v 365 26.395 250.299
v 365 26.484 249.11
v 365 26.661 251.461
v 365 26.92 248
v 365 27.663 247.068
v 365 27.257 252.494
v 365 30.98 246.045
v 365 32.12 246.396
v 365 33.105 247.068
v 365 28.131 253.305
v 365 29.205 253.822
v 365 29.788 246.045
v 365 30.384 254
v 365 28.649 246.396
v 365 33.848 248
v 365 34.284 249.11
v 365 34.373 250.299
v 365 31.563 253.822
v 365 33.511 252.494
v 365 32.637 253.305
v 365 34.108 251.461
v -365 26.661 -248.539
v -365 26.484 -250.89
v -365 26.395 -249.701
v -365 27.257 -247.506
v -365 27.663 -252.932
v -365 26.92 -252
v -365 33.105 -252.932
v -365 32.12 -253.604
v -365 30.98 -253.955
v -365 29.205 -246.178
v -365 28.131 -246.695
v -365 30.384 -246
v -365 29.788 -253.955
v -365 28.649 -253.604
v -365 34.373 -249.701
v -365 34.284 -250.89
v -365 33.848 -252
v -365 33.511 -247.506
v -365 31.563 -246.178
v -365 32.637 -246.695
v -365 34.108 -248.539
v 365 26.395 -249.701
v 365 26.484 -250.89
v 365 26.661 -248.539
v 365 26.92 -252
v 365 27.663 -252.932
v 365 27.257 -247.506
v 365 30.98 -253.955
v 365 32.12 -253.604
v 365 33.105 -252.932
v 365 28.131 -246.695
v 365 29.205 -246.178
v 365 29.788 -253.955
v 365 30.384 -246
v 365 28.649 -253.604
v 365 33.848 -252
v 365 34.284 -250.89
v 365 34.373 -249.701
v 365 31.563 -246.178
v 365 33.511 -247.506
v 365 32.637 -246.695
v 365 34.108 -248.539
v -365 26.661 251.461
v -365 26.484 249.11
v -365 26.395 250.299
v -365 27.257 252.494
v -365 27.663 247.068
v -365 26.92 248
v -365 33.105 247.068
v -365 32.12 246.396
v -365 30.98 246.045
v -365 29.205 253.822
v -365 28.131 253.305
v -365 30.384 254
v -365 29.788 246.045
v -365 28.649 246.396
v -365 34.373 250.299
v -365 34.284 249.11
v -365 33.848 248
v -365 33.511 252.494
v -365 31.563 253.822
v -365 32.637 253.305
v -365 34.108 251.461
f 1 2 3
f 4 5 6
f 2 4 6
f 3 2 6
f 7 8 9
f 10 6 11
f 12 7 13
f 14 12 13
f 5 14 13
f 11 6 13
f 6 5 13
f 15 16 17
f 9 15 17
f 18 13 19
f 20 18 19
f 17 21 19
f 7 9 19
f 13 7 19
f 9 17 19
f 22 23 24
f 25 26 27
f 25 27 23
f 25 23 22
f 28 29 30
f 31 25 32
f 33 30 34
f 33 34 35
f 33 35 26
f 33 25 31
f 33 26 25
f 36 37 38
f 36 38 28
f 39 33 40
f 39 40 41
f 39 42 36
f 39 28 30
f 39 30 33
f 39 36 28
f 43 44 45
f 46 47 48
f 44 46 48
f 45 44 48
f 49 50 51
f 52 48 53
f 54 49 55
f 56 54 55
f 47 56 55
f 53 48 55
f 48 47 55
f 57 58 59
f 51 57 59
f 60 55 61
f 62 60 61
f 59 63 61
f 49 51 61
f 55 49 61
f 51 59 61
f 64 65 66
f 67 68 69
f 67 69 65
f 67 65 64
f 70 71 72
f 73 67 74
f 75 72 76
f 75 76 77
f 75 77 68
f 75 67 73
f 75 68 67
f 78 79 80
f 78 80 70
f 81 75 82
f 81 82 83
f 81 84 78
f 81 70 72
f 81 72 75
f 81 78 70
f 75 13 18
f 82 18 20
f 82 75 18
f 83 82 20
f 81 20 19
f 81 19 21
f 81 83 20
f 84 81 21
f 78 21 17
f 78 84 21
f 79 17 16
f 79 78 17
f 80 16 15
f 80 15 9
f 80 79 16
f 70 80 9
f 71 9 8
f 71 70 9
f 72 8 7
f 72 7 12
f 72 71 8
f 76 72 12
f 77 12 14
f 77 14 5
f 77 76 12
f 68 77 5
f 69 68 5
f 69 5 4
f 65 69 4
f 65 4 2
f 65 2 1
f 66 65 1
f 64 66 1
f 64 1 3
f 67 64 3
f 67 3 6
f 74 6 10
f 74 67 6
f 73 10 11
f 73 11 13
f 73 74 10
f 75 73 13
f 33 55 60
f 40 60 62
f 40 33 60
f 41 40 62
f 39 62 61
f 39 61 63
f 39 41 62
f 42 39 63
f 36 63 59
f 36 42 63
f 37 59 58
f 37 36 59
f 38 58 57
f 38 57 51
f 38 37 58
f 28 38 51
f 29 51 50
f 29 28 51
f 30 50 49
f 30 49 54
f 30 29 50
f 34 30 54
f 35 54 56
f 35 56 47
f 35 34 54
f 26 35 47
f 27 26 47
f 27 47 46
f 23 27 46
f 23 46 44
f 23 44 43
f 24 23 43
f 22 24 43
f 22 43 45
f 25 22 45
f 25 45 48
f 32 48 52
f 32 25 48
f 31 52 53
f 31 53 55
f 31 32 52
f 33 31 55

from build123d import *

# Parameters (mm, degrees)
BOSS_EXTRUDE1_DEPTH   = 265
BOSS_EXTRUDE1_2_DEPTH = 265
BOSS_EXTRUDE2_DEPTH   = 335
SKETCH16_R            = 4
BOSS_EXTRUDE3_DEPTH   = 730
BOSS_EXTRUDE3_2_DEPTH = 730


with BuildPart() as part:
    # Sketch13 → Boss-Extrude1 (new, symmetric)
    with BuildSketch(Plane.XY):
        with BuildLine():
            Line((356.00446543, 0.899999619), (355.484852164, 0))
            Line((355.484852164, 0), (356.00446543, -0.899999619))
            Line((356.00446543, -0.899999619), (356.00446543, -4.204465866))
            Line((356.00446543, -4.204465866), (360.049999564, -8.25))
            Line((360.049999564, -8.25), (362.59999928, -8.25))
            ThreePointArc((362.59999928, -8.25), (362.741420837, -8.191421273), (362.799999564, -8.049999716))
            Line((362.799999564, -8.049999716), (362.799999564, -4.649999613))
            ThreePointArc((362.799999564, -4.649999613), (362.975735606, -4.225735278), (363.39999994, -4.049999237))
            Line((363.39999994, -4.049999237), (364.300000043, -4.049999237))
            ThreePointArc((364.300000043, -4.049999237), (364.4414216, -4.108577964), (364.500000327, -4.249999521))
            Line((364.500000327, -4.249999521), (364.500000327, -4.349998953))
            ThreePointArc((364.500000327, -4.349998953), (364.558579054, -4.49142051), (364.700000611, -4.549999237))
            Line((364.700000611, -4.549999237), (364.799999716, -4.549999237))
            ThreePointArc((364.799999716, -4.549999237), (364.941421273, -4.608577964), (365, -4.749999521))
            Line((365, -4.749999521), (365, -13.000000346))
            ThreePointArc((365, -13.000000346), (364.414213664, -14.414213664), (363.000000346, -15))
            Line((363.000000346, -15), (354.749999945, -15))
            ThreePointArc((354.749999945, -15), (354.60857832, -14.941421245), (354.549999564, -14.799999619))
            Line((354.549999564, -14.799999619), (354.549999564, -14.69999942))
            ThreePointArc((354.549999564, -14.69999942), (354.49142109, -14.558578474), (354.350000144, -14.5))
            Line((354.350000144, -14.5), (354.250000374, -14.5))
            ThreePointArc((354.250000374, -14.5), (354.108578753, -14.441421247), (354.05, -14.299999626))
            Line((354.05, -14.299999626), (354.05, -13.399999434))
            ThreePointArc((354.05, -13.399999434), (354.225735989, -12.975735226), (354.650000197, -12.799999237))
            Line((354.650000197, -12.799999237), (358.049999924, -12.799999237))
            ThreePointArc((358.049999924, -12.799999237), (358.191421565, -12.741420475), (358.250000327, -12.599998834))
            Line((358.250000327, -12.599998834), (358.250000327, -10.049999237))
            Line((358.250000327, -10.049999237), (354.204466193, -6))
            Line((354.204466193, -6), (350.899999946, -6))
            Line((350.899999946, -6), (350, -5.484851837))
            Line((350, -5.484851837), (349.100000054, -6))
            Line((349.100000054, -6), (345.795533807, -6))
            Line((345.795533807, -6), (341.749999673, -10.049999237))
            Line((341.749999673, -10.049999237), (341.749999673, -12.599998834))
            ThreePointArc((341.749999673, -12.599998834), (341.808578435, -12.741420475), (341.950000076, -12.799999237))
            Line((341.950000076, -12.799999237), (345.349999803, -12.799999237))
            ThreePointArc((345.349999803, -12.799999237), (345.774264011, -12.975735226), (345.95, -13.399999434))
            Line((345.95, -13.399999434), (345.95, -14.299999626))
            ThreePointArc((345.95, -14.299999626), (345.891421247, -14.441421247), (345.749999626, -14.5))
            Line((345.749999626, -14.5), (345.649999856, -14.5))
            ThreePointArc((345.649999856, -14.5), (345.50857891, -14.558578474), (345.450000436, -14.69999942))
            Line((345.450000436, -14.69999942), (345.450000436, -14.799999619))
            ThreePointArc((345.450000436, -14.799999619), (345.39142168, -14.941421245), (345.250000055, -15))
            Line((345.250000055, -15), (336.999999654, -15))
            ThreePointArc((336.999999654, -15), (335.585786336, -14.414213664), (335, -13.000000346))
            Line((335, -13.000000346), (335, -4.749999521))
            ThreePointArc((335, -4.749999521), (335.058578727, -4.608577964), (335.200000284, -4.549999237))
            Line((335.200000284, -4.549999237), (335.299999389, -4.549999237))
            ThreePointArc((335.299999389, -4.549999237), (335.441420946, -4.49142051), (335.499999673, -4.349998953))
            Line((335.499999673, -4.349998953), (335.499999673, -4.249999521))
            ThreePointArc((335.499999673, -4.249999521), (335.5585784, -4.108577964), (335.699999957, -4.049999237))
            Line((335.699999957, -4.049999237), (336.60000006, -4.049999237))
            ThreePointArc((336.60000006, -4.049999237), (337.024264394, -4.225735278), (337.200000436, -4.649999613))
            Line((337.200000436, -4.649999613), (337.200000436, -8.049999716))
            ThreePointArc((337.200000436, -8.049999716), (337.258579163, -8.191421273), (337.40000072, -8.25))
            Line((337.40000072, -8.25), (339.950000436, -8.25))
            Line((339.950000436, -8.25), (343.99553457, -4.204465866))
            Line((343.99553457, -4.204465866), (343.99553457, -0.899999619))
            Line((343.99553457, -0.899999619), (344.515147836, 0))
            Line((344.515147836, 0), (343.99553457, 0.899999619))
            Line((343.99553457, 0.899999619), (343.99553457, 4.204465866))
            Line((343.99553457, 4.204465866), (339.950000436, 8.25))
            Line((339.950000436, 8.25), (337.40000072, 8.25))
            ThreePointArc((337.40000072, 8.25), (337.258579163, 8.191421273), (337.200000436, 8.049999716))
            Line((337.200000436, 8.049999716), (337.200000436, 4.649999613))
            ThreePointArc((337.200000436, 4.649999613), (337.024264394, 4.225735278), (336.60000006, 4.049999237))
            Line((336.60000006, 4.049999237), (335.699999957, 4.049999237))
            ThreePointArc((335.699999957, 4.049999237), (335.5585784, 4.108577964), (335.499999673, 4.249999521))
            Line((335.499999673, 4.249999521), (335.499999673, 4.349998953))
            ThreePointArc((335.499999673, 4.349998953), (335.441420946, 4.49142051), (335.299999389, 4.549999237))
            Line((335.299999389, 4.549999237), (335.200000284, 4.549999237))
            ThreePointArc((335.200000284, 4.549999237), (335.058578727, 4.608577964), (335, 4.749999521))
            Line((335, 4.749999521), (335, 13.000000346))
            ThreePointArc((335, 13.000000346), (335.585786336, 14.414213664), (336.999999654, 15))
            Line((336.999999654, 15), (345.250000055, 15))
            ThreePointArc((345.250000055, 15), (345.39142168, 14.941421245), (345.450000436, 14.799999619))
            Line((345.450000436, 14.799999619), (345.450000436, 14.69999942))
            ThreePointArc((345.450000436, 14.69999942), (345.50857891, 14.558578474), (345.649999856, 14.5))
            Line((345.649999856, 14.5), (345.749999626, 14.5))
            ThreePointArc((345.749999626, 14.5), (345.891421247, 14.441421247), (345.95, 14.299999626))
            Line((345.95, 14.299999626), (345.95, 13.399999434))
            ThreePointArc((345.95, 13.399999434), (345.774264011, 12.975735226), (345.349999803, 12.799999237))
            Line((345.349999803, 12.799999237), (341.950000076, 12.799999237))
            ThreePointArc((341.950000076, 12.799999237), (341.808578435, 12.741420475), (341.749999673, 12.599998834))
            Line((341.749999673, 12.599998834), (341.749999673, 10.049999237))
            Line((341.749999673, 10.049999237), (345.795533807, 6))
            Line((345.795533807, 6), (349.100000054, 6))
            Line((349.100000054, 6), (350, 5.484851837))
            Line((350, 5.484851837), (350.899999946, 6))
            Line((350.899999946, 6), (354.204466193, 6))
            Line((354.204466193, 6), (358.250000327, 10.049999237))
            Line((358.250000327, 10.049999237), (358.250000327, 12.599998834))
            ThreePointArc((358.250000327, 12.599998834), (358.191421565, 12.741420475), (358.049999924, 12.799999237))
            Line((358.049999924, 12.799999237), (354.650000197, 12.799999237))
            ThreePointArc((354.650000197, 12.799999237), (354.225735989, 12.975735226), (354.05, 13.399999434))
            Line((354.05, 13.399999434), (354.05, 14.299999626))
            ThreePointArc((354.05, 14.299999626), (354.108578753, 14.441421247), (354.250000374, 14.5))
            Line((354.250000374, 14.5), (354.350000144, 14.5))
            ThreePointArc((354.350000144, 14.5), (354.49142109, 14.558578474), (354.549999564, 14.69999942))
            Line((354.549999564, 14.69999942), (354.549999564, 14.799999619))
            ThreePointArc((354.549999564, 14.799999619), (354.60857832, 14.941421245), (354.749999945, 15))
            Line((354.749999945, 15), (363.000000346, 15))
            ThreePointArc((363.000000346, 15), (364.414213664, 14.414213664), (365, 13.000000346))
            Line((365, 13.000000346), (365, 4.749999521))
            ThreePointArc((365, 4.749999521), (364.941421273, 4.608577964), (364.799999716, 4.549999237))
            Line((364.799999716, 4.549999237), (364.700000611, 4.549999237))
            ThreePointArc((364.700000611, 4.549999237), (364.558579054, 4.49142051), (364.500000327, 4.349998953))
            Line((364.500000327, 4.349998953), (364.500000327, 4.249999521))
            ThreePointArc((364.500000327, 4.249999521), (364.4414216, 4.108577964), (364.300000043, 4.049999237))
            Line((364.300000043, 4.049999237), (363.39999994, 4.049999237))
            ThreePointArc((363.39999994, 4.049999237), (362.975735606, 4.225735278), (362.799999564, 4.649999613))
            Line((362.799999564, 4.649999613), (362.799999564, 8.049999716))
            ThreePointArc((362.799999564, 8.049999716), (362.741420837, 8.191421273), (362.59999928, 8.25))
            Line((362.59999928, 8.25), (360.049999564, 8.25))
            Line((360.049999564, 8.25), (356.00446543, 4.204465866))
            Line((356.00446543, 4.204465866), (356.00446543, 0.899999619))
        make_face()
        with BuildLine():
            Line((363.70000109, 12.700000408), (363.70000109, 10.499999626))
            ThreePointArc((363.70000109, 10.499999626), (363.407107874, 9.792892851), (362.7000011, 9.499999635))
            Line((362.7000011, 9.499999635), (360.500000318, 9.499999635))
            ThreePointArc((360.500000318, 9.499999635), (359.792893543, 9.792892851), (359.500000327, 10.499999626))
            Line((359.500000327, 10.499999626), (359.500000327, 12.700000408))
            ThreePointArc((359.500000327, 12.700000408), (359.792893543, 13.407107182), (360.500000318, 13.700000398))
            Line((360.500000318, 13.700000398), (362.7000011, 13.700000398))
            ThreePointArc((362.7000011, 13.700000398), (363.407107874, 13.407107182), (363.70000109, 12.700000408))
        make_face(mode=Mode.SUBTRACT)
        with BuildLine():
            Line((353.135929412, 4.518400903), (351.600129524, 3.280561767))
            ThreePointArc((351.600129524, 3.280561767), (350, 3.65), (348.399870476, 3.280561767))
            Line((348.399870476, 3.280561767), (346.864070588, 4.518400903))
            ThreePointArc((346.864070588, 4.518400903), (346.118997741, 3.897155561), (345.494663108, 3.154669473))
            Line((345.494663108, 3.154669473), (346.719438268, 1.600129597))
            ThreePointArc((346.719438268, 1.600129597), (346.35, 0), (346.719438268, -1.600129597))
            Line((346.719438268, -1.600129597), (345.494663108, -3.154669473))
            ThreePointArc((345.494663108, -3.154669473), (346.118997741, -3.897155561), (346.864070588, -4.518400903))
            Line((346.864070588, -4.518400903), (348.399870476, -3.280561767))
            ThreePointArc((348.399870476, -3.280561767), (350, -3.65), (351.600129524, -3.280561767))
            Line((351.600129524, -3.280561767), (353.135929412, -4.518400903))
            ThreePointArc((353.135929412, -4.518400903), (353.881002259, -3.897155561), (354.505336892, -3.154669473))
            Line((354.505336892, -3.154669473), (353.280561732, -1.600129597))
            ThreePointArc((353.280561732, -1.600129597), (353.65, 0), (353.280561732, 1.600129597))
            Line((353.280561732, 1.600129597), (354.505336892, 3.154669473))
            ThreePointArc((354.505336892, 3.154669473), (353.881002259, 3.897155561), (353.135929412, 4.518400903))
        make_face(mode=Mode.SUBTRACT)
        with BuildLine():
            Line((336.29999891, -12.700000408), (336.29999891, -10.499999626))
            ThreePointArc((336.29999891, -10.499999626), (336.592892126, -9.792892851), (337.2999989, -9.499999635))
            Line((337.2999989, -9.499999635), (339.499999682, -9.499999635))
            ThreePointArc((339.499999682, -9.499999635), (340.207106457, -9.792892851), (340.499999673, -10.499999626))
            Line((340.499999673, -10.499999626), (340.499999673, -12.700000408))
            ThreePointArc((340.499999673, -12.700000408), (340.207106457, -13.407107182), (339.499999682, -13.700000398))
            Line((339.499999682, -13.700000398), (337.2999989, -13.700000398))
            ThreePointArc((337.2999989, -13.700000398), (336.592892126, -13.407107182), (336.29999891, -12.700000408))
        make_face(mode=Mode.SUBTRACT)
        with BuildLine():
            Line((360.500000318, -13.700000398), (362.7000011, -13.700000398))
            ThreePointArc((362.7000011, -13.700000398), (363.407107874, -13.407107182), (363.70000109, -12.700000408))
            Line((363.70000109, -12.700000408), (363.70000109, -10.499999626))
            ThreePointArc((363.70000109, -10.499999626), (363.407107874, -9.792892851), (362.7000011, -9.499999635))
            Line((362.7000011, -9.499999635), (360.500000318, -9.499999635))
            ThreePointArc((360.500000318, -9.499999635), (359.792893543, -9.792892851), (359.500000327, -10.499999626))
            Line((359.500000327, -10.499999626), (359.500000327, -12.700000408))
            ThreePointArc((359.500000327, -12.700000408), (359.792893543, -13.407107182), (360.500000318, -13.700000398))
        make_face(mode=Mode.SUBTRACT)
        with BuildLine():
            Line((339.499999682, 13.700000398), (337.2999989, 13.700000398))
            ThreePointArc((337.2999989, 13.700000398), (336.592892126, 13.407107182), (336.29999891, 12.700000408))
            Line((336.29999891, 12.700000408), (336.29999891, 10.499999626))
            ThreePointArc((336.29999891, 10.499999626), (336.592892126, 9.792892851), (337.2999989, 9.499999635))
            Line((337.2999989, 9.499999635), (339.499999682, 9.499999635))
            ThreePointArc((339.499999682, 9.499999635), (340.207106457, 9.792892851), (340.499999673, 10.499999626))
            Line((340.499999673, 10.499999626), (340.499999673, 12.700000408))
            ThreePointArc((340.499999673, 12.700000408), (340.207106457, 13.407107182), (339.499999682, 13.700000398))
        make_face(mode=Mode.SUBTRACT)
    extrude(amount=BOSS_EXTRUDE1_DEPTH, both=True)



with BuildPart() as body_2:
    # Sketch13 → Boss-Extrude1 2 (new, symmetric)
    with BuildSketch(Plane.XY):
        with BuildLine():
            Line((-337.40000072, 8.25), (-339.950000436, 8.25))
            Line((-339.950000436, 8.25), (-343.99553457, 4.204465866))
            Line((-343.99553457, 4.204465866), (-343.99553457, 0.899999619))
            Line((-343.99553457, 0.899999619), (-344.515147836, 0))
            Line((-344.515147836, 0), (-343.99553457, -0.899999619))
            Line((-343.99553457, -0.899999619), (-343.99553457, -4.204465866))
            Line((-343.99553457, -4.204465866), (-339.950000436, -8.25))
            Line((-339.950000436, -8.25), (-337.40000072, -8.25))
            ThreePointArc((-337.40000072, -8.25), (-337.258579163, -8.191421273), (-337.200000436, -8.049999716))
            Line((-337.200000436, -8.049999716), (-337.200000436, -4.649999613))
            ThreePointArc((-337.200000436, -4.649999613), (-337.024264394, -4.225735278), (-336.60000006, -4.049999237))
            Line((-336.60000006, -4.049999237), (-335.699999957, -4.049999237))
            ThreePointArc((-335.699999957, -4.049999237), (-335.5585784, -4.108577964), (-335.499999673, -4.249999521))
            Line((-335.499999673, -4.249999521), (-335.499999673, -4.349998953))
            ThreePointArc((-335.499999673, -4.349998953), (-335.441420946, -4.49142051), (-335.299999389, -4.549999237))
            Line((-335.299999389, -4.549999237), (-335.200000284, -4.549999237))
            ThreePointArc((-335.200000284, -4.549999237), (-335.058578727, -4.608577964), (-335, -4.749999521))
            Line((-335, -4.749999521), (-335, -13.000000346))
            ThreePointArc((-335, -13.000000346), (-335.585786336, -14.414213664), (-336.999999654, -15))
            Line((-336.999999654, -15), (-345.250000055, -15))
            ThreePointArc((-345.250000055, -15), (-345.39142168, -14.941421245), (-345.450000436, -14.799999619))
            Line((-345.450000436, -14.799999619), (-345.450000436, -14.69999942))
            ThreePointArc((-345.450000436, -14.69999942), (-345.50857891, -14.558578474), (-345.649999856, -14.5))
            Line((-345.649999856, -14.5), (-345.749999626, -14.5))
            ThreePointArc((-345.749999626, -14.5), (-345.891421247, -14.441421247), (-345.95, -14.299999626))
            Line((-345.95, -14.299999626), (-345.95, -13.399999434))
            ThreePointArc((-345.95, -13.399999434), (-345.774264011, -12.975735226), (-345.349999803, -12.799999237))
            Line((-345.349999803, -12.799999237), (-341.950000076, -12.799999237))
            ThreePointArc((-341.950000076, -12.799999237), (-341.808578435, -12.741420475), (-341.749999673, -12.599998834))
            Line((-341.749999673, -12.599998834), (-341.749999673, -10.049999237))
            Line((-341.749999673, -10.049999237), (-345.795533807, -6))
            Line((-345.795533807, -6), (-349.100000054, -6))
            Line((-349.100000054, -6), (-350, -5.484851837))
            Line((-350, -5.484851837), (-350.899999946, -6))
            Line((-350.899999946, -6), (-354.204466193, -6))
            Line((-354.204466193, -6), (-358.250000327, -10.049999237))
            Line((-358.250000327, -10.049999237), (-358.250000327, -12.599998834))
            ThreePointArc((-358.250000327, -12.599998834), (-358.191421565, -12.741420475), (-358.049999924, -12.799999237))
            Line((-358.049999924, -12.799999237), (-354.650000197, -12.799999237))
            ThreePointArc((-354.650000197, -12.799999237), (-354.225735989, -12.975735226), (-354.05, -13.399999434))
            Line((-354.05, -13.399999434), (-354.05, -14.299999626))
            ThreePointArc((-354.05, -14.299999626), (-354.108578753, -14.441421247), (-354.250000374, -14.5))
            Line((-354.250000374, -14.5), (-354.350000144, -14.5))
            ThreePointArc((-354.350000144, -14.5), (-354.49142109, -14.558578474), (-354.549999564, -14.69999942))
            Line((-354.549999564, -14.69999942), (-354.549999564, -14.799999619))
            ThreePointArc((-354.549999564, -14.799999619), (-354.60857832, -14.941421245), (-354.749999945, -15))
            Line((-354.749999945, -15), (-363.000000346, -15))
            ThreePointArc((-363.000000346, -15), (-364.414213664, -14.414213664), (-365, -13.000000346))
            Line((-365, -13.000000346), (-365, -4.749999521))
            ThreePointArc((-365, -4.749999521), (-364.941421273, -4.608577964), (-364.799999716, -4.549999237))
            Line((-364.799999716, -4.549999237), (-364.700000611, -4.549999237))
            ThreePointArc((-364.700000611, -4.549999237), (-364.558579054, -4.49142051), (-364.500000327, -4.349998953))
            Line((-364.500000327, -4.349998953), (-364.500000327, -4.249999521))
            ThreePointArc((-364.500000327, -4.249999521), (-364.4414216, -4.108577964), (-364.300000043, -4.049999237))
            Line((-364.300000043, -4.049999237), (-363.39999994, -4.049999237))
            ThreePointArc((-363.39999994, -4.049999237), (-362.975735606, -4.225735278), (-362.799999564, -4.649999613))
            Line((-362.799999564, -4.649999613), (-362.799999564, -8.049999716))
            ThreePointArc((-362.799999564, -8.049999716), (-362.741420837, -8.191421273), (-362.59999928, -8.25))
            Line((-362.59999928, -8.25), (-360.049999564, -8.25))
            Line((-360.049999564, -8.25), (-356.00446543, -4.204465866))
            Line((-356.00446543, -4.204465866), (-356.00446543, -0.899999619))
            Line((-356.00446543, -0.899999619), (-355.484852164, 0))
            Line((-355.484852164, 0), (-356.00446543, 0.899999619))
            Line((-356.00446543, 0.899999619), (-356.00446543, 4.204465866))
            Line((-356.00446543, 4.204465866), (-360.049999564, 8.25))
            Line((-360.049999564, 8.25), (-362.59999928, 8.25))
            ThreePointArc((-362.59999928, 8.25), (-362.741420837, 8.191421273), (-362.799999564, 8.049999716))
            Line((-362.799999564, 8.049999716), (-362.799999564, 4.649999613))
            ThreePointArc((-362.799999564, 4.649999613), (-362.975735606, 4.225735278), (-363.39999994, 4.049999237))
            Line((-363.39999994, 4.049999237), (-364.300000043, 4.049999237))
            ThreePointArc((-364.300000043, 4.049999237), (-364.4414216, 4.108577964), (-364.500000327, 4.249999521))
            Line((-364.500000327, 4.249999521), (-364.500000327, 4.349998953))
            ThreePointArc((-364.500000327, 4.349998953), (-364.558579054, 4.49142051), (-364.700000611, 4.549999237))
            Line((-364.700000611, 4.549999237), (-364.799999716, 4.549999237))
            ThreePointArc((-364.799999716, 4.549999237), (-364.941421273, 4.608577964), (-365, 4.749999521))
            Line((-365, 4.749999521), (-365, 13.000000346))
            ThreePointArc((-365, 13.000000346), (-364.414213664, 14.414213664), (-363.000000346, 15))
            Line((-363.000000346, 15), (-354.749999945, 15))
            ThreePointArc((-354.749999945, 15), (-354.60857832, 14.941421245), (-354.549999564, 14.799999619))
            Line((-354.549999564, 14.799999619), (-354.549999564, 14.69999942))
            ThreePointArc((-354.549999564, 14.69999942), (-354.49142109, 14.558578474), (-354.350000144, 14.5))
            Line((-354.350000144, 14.5), (-354.250000374, 14.5))
            ThreePointArc((-354.250000374, 14.5), (-354.108578753, 14.441421247), (-354.05, 14.299999626))
            Line((-354.05, 14.299999626), (-354.05, 13.399999434))
            ThreePointArc((-354.05, 13.399999434), (-354.225735989, 12.975735226), (-354.650000197, 12.799999237))
            Line((-354.650000197, 12.799999237), (-358.049999924, 12.799999237))
            ThreePointArc((-358.049999924, 12.799999237), (-358.191421565, 12.741420475), (-358.250000327, 12.599998834))
            Line((-358.250000327, 12.599998834), (-358.250000327, 10.049999237))
            Line((-358.250000327, 10.049999237), (-354.204466193, 6))
            Line((-354.204466193, 6), (-350.899999946, 6))
            Line((-350.899999946, 6), (-350, 5.484851837))
            Line((-350, 5.484851837), (-349.100000054, 6))
            Line((-349.100000054, 6), (-345.795533807, 6))
            Line((-345.795533807, 6), (-341.749999673, 10.049999237))
            Line((-341.749999673, 10.049999237), (-341.749999673, 12.599998834))
            ThreePointArc((-341.749999673, 12.599998834), (-341.808578435, 12.741420475), (-341.950000076, 12.799999237))
            Line((-341.950000076, 12.799999237), (-345.349999803, 12.799999237))
            ThreePointArc((-345.349999803, 12.799999237), (-345.774264011, 12.975735226), (-345.95, 13.399999434))
            Line((-345.95, 13.399999434), (-345.95, 14.299999626))
            ThreePointArc((-345.95, 14.299999626), (-345.891421247, 14.441421247), (-345.749999626, 14.5))
            Line((-345.749999626, 14.5), (-345.649999856, 14.5))
            ThreePointArc((-345.649999856, 14.5), (-345.50857891, 14.558578474), (-345.450000436, 14.69999942))
            Line((-345.450000436, 14.69999942), (-345.450000436, 14.799999619))
            ThreePointArc((-345.450000436, 14.799999619), (-345.39142168, 14.941421245), (-345.250000055, 15))
            Line((-345.250000055, 15), (-336.999999654, 15))
            ThreePointArc((-336.999999654, 15), (-335.585786336, 14.414213664), (-335, 13.000000346))
            Line((-335, 13.000000346), (-335, 4.749999521))
            ThreePointArc((-335, 4.749999521), (-335.058578727, 4.608577964), (-335.200000284, 4.549999237))
            Line((-335.200000284, 4.549999237), (-335.299999389, 4.549999237))
            ThreePointArc((-335.299999389, 4.549999237), (-335.441420946, 4.49142051), (-335.499999673, 4.349998953))
            Line((-335.499999673, 4.349998953), (-335.499999673, 4.249999521))
            ThreePointArc((-335.499999673, 4.249999521), (-335.5585784, 4.108577964), (-335.699999957, 4.049999237))
            Line((-335.699999957, 4.049999237), (-336.60000006, 4.049999237))
            ThreePointArc((-336.60000006, 4.049999237), (-337.024264394, 4.225735278), (-337.200000436, 4.649999613))
            Line((-337.200000436, 4.649999613), (-337.200000436, 8.049999716))
            ThreePointArc((-337.200000436, 8.049999716), (-337.258579163, 8.191421273), (-337.40000072, 8.25))
        make_face()
        with BuildLine():
            Line((-336.29999891, -12.700000408), (-336.29999891, -10.499999626))
            ThreePointArc((-336.29999891, -10.499999626), (-336.592892126, -9.792892851), (-337.2999989, -9.499999635))
            Line((-337.2999989, -9.499999635), (-339.499999682, -9.499999635))
            ThreePointArc((-339.499999682, -9.499999635), (-340.207106457, -9.792892851), (-340.499999673, -10.499999626))
            Line((-340.499999673, -10.499999626), (-340.499999673, -12.700000408))
            ThreePointArc((-340.499999673, -12.700000408), (-340.207106457, -13.407107182), (-339.499999682, -13.700000398))
            Line((-339.499999682, -13.700000398), (-337.2999989, -13.700000398))
            ThreePointArc((-337.2999989, -13.700000398), (-336.592892126, -13.407107182), (-336.29999891, -12.700000408))
        make_face(mode=Mode.SUBTRACT)
        with BuildLine():
            Line((-346.719438268, 1.600129597), (-345.494663108, 3.154669473))
            ThreePointArc((-345.494663108, 3.154669473), (-346.118997741, 3.897155561), (-346.864070588, 4.518400903))
            Line((-346.864070588, 4.518400903), (-348.399870476, 3.280561767))
            ThreePointArc((-348.399870476, 3.280561767), (-350, 3.65), (-351.600129524, 3.280561767))
            Line((-351.600129524, 3.280561767), (-353.135929412, 4.518400903))
            ThreePointArc((-353.135929412, 4.518400903), (-353.881002259, 3.897155561), (-354.505336892, 3.154669473))
            Line((-354.505336892, 3.154669473), (-353.280561732, 1.600129597))
            ThreePointArc((-353.280561732, 1.600129597), (-353.65, 0), (-353.280561732, -1.600129597))
            Line((-353.280561732, -1.600129597), (-354.505336892, -3.154669473))
            ThreePointArc((-354.505336892, -3.154669473), (-353.881002259, -3.897155561), (-353.135929412, -4.518400903))
            Line((-353.135929412, -4.518400903), (-351.600129524, -3.280561767))
            ThreePointArc((-351.600129524, -3.280561767), (-350, -3.65), (-348.399870476, -3.280561767))
            Line((-348.399870476, -3.280561767), (-346.864070588, -4.518400903))
            ThreePointArc((-346.864070588, -4.518400903), (-346.118997741, -3.897155561), (-345.494663108, -3.154669473))
            Line((-345.494663108, -3.154669473), (-346.719438268, -1.600129597))
            ThreePointArc((-346.719438268, -1.600129597), (-346.35, 0), (-346.719438268, 1.600129597))
        make_face(mode=Mode.SUBTRACT)
        with BuildLine():
            Line((-336.29999891, 12.700000408), (-336.29999891, 10.499999626))
            ThreePointArc((-336.29999891, 10.499999626), (-336.592892126, 9.792892851), (-337.2999989, 9.499999635))
            Line((-337.2999989, 9.499999635), (-339.499999682, 9.499999635))
            ThreePointArc((-339.499999682, 9.499999635), (-340.207106457, 9.792892851), (-340.499999673, 10.499999626))
            Line((-340.499999673, 10.499999626), (-340.499999673, 12.700000408))
            ThreePointArc((-340.499999673, 12.700000408), (-340.207106457, 13.407107182), (-339.499999682, 13.700000398))
            Line((-339.499999682, 13.700000398), (-337.2999989, 13.700000398))
            ThreePointArc((-337.2999989, 13.700000398), (-336.592892126, 13.407107182), (-336.29999891, 12.700000408))
        make_face(mode=Mode.SUBTRACT)
        with BuildLine():
            Line((-359.500000327, -12.700000408), (-359.500000327, -10.499999626))
            ThreePointArc((-359.500000327, -10.499999626), (-359.792893543, -9.792892851), (-360.500000318, -9.499999635))
            Line((-360.500000318, -9.499999635), (-362.7000011, -9.499999635))
            ThreePointArc((-362.7000011, -9.499999635), (-363.407107874, -9.792892851), (-363.70000109, -10.499999626))
            Line((-363.70000109, -10.499999626), (-363.70000109, -12.700000408))
            ThreePointArc((-363.70000109, -12.700000408), (-363.407107874, -13.407107182), (-362.7000011, -13.700000398))
            Line((-362.7000011, -13.700000398), (-360.500000318, -13.700000398))
            ThreePointArc((-360.500000318, -13.700000398), (-359.792893543, -13.407107182), (-359.500000327, -12.700000408))
        make_face(mode=Mode.SUBTRACT)
        with BuildLine():
            Line((-363.70000109, 12.700000408), (-363.70000109, 10.499999626))
            ThreePointArc((-363.70000109, 10.499999626), (-363.407107874, 9.792892851), (-362.7000011, 9.499999635))
            Line((-362.7000011, 9.499999635), (-360.500000318, 9.499999635))
            ThreePointArc((-360.500000318, 9.499999635), (-359.792893543, 9.792892851), (-359.500000327, 10.499999626))
            Line((-359.500000327, 10.499999626), (-359.500000327, 12.700000408))
            ThreePointArc((-359.500000327, 12.700000408), (-359.792893543, 13.407107182), (-360.500000318, 13.700000398))
            Line((-360.500000318, 13.700000398), (-362.7000011, 13.700000398))
            ThreePointArc((-362.7000011, 13.700000398), (-363.407107874, 13.407107182), (-363.70000109, 12.700000408))
        make_face(mode=Mode.SUBTRACT)
    extrude(amount=BOSS_EXTRUDE1_2_DEPTH, both=True)


with BuildPart() as part_1:
    add(part.part)

    add(body_2.part)  # Boss-Extrude2 merges body 2
    # Sketch14 → Boss-Extrude2 (add, symmetric)
    # profile 1 of 2: a face of its own
    with BuildSketch(Plane(origin=(0, 0, 0), x_dir=(0, 0, -1), z_dir=(1, 0, 0))):
        with BuildLine():
            Line((-235.299999389, 4.549999237), (-235.200000284, 4.549999237))
            ThreePointArc((-235.200000284, 4.549999237), (-235.058578727, 4.608577964), (-235, 4.749999521))
            Line((-235, 4.749999521), (-235, 13.000000346))
            ThreePointArc((-235, 13.000000346), (-235.585786336, 14.414213664), (-236.999999654, 15))
            Line((-236.999999654, 15), (-245.250000055, 15))
            ThreePointArc((-245.250000055, 15), (-245.39142168, 14.941421245), (-245.450000436, 14.799999619))
            Line((-245.450000436, 14.799999619), (-245.450000436, 14.69999942))
            ThreePointArc((-245.450000436, 14.69999942), (-245.50857891, 14.558578474), (-245.649999856, 14.5))
            Line((-245.649999856, 14.5), (-245.749999626, 14.5))
            ThreePointArc((-245.749999626, 14.5), (-245.891421247, 14.441421247), (-245.95, 14.299999626))
            Line((-245.95, 14.299999626), (-245.95, 13.399999434))
            ThreePointArc((-245.95, 13.399999434), (-245.774264011, 12.975735226), (-245.349999803, 12.799999237))
            Line((-245.349999803, 12.799999237), (-241.950000076, 12.799999237))
            ThreePointArc((-241.950000076, 12.799999237), (-241.808578435, 12.741420475), (-241.749999673, 12.599998834))
            Line((-241.749999673, 12.599998834), (-241.749999673, 10.049999237))
            Line((-241.749999673, 10.049999237), (-245.795533807, 6))
            Line((-245.795533807, 6), (-249.100000054, 6))
            Line((-249.100000054, 6), (-250, 5.484851837))
            Line((-250, 5.484851837), (-250.899999946, 6))
            Line((-250.899999946, 6), (-254.204466193, 6))
            Line((-254.204466193, 6), (-258.250000327, 10.049999237))
            Line((-258.250000327, 10.049999237), (-258.250000327, 12.599998834))
            ThreePointArc((-258.250000327, 12.599998834), (-258.191421565, 12.741420475), (-258.049999924, 12.799999237))
            Line((-258.049999924, 12.799999237), (-254.650000197, 12.799999237))
            ThreePointArc((-254.650000197, 12.799999237), (-254.225735989, 12.975735226), (-254.05, 13.399999434))
            Line((-254.05, 13.399999434), (-254.05, 14.299999626))
            ThreePointArc((-254.05, 14.299999626), (-254.108578753, 14.441421247), (-254.250000374, 14.5))
            Line((-254.250000374, 14.5), (-254.350000144, 14.5))
            ThreePointArc((-254.350000144, 14.5), (-254.49142109, 14.558578474), (-254.549999564, 14.69999942))
            Line((-254.549999564, 14.69999942), (-254.549999564, 14.799999619))
            ThreePointArc((-254.549999564, 14.799999619), (-254.60857832, 14.941421245), (-254.749999945, 15))
            Line((-254.749999945, 15), (-263.000000346, 15))
            ThreePointArc((-263.000000346, 15), (-264.414213664, 14.414213664), (-265, 13.000000346))
            Line((-265, 13.000000346), (-265, 4.749999521))
            ThreePointArc((-265, 4.749999521), (-264.941421273, 4.608577964), (-264.799999716, 4.549999237))
            Line((-264.799999716, 4.549999237), (-264.700000611, 4.549999237))
            ThreePointArc((-264.700000611, 4.549999237), (-264.558579054, 4.49142051), (-264.500000327, 4.349998953))
            Line((-264.500000327, 4.349998953), (-264.500000327, 4.249999521))
            ThreePointArc((-264.500000327, 4.249999521), (-264.4414216, 4.108577964), (-264.300000043, 4.049999237))
            Line((-264.300000043, 4.049999237), (-263.39999994, 4.049999237))
            ThreePointArc((-263.39999994, 4.049999237), (-262.975735606, 4.225735278), (-262.799999564, 4.649999613))
            Line((-262.799999564, 4.649999613), (-262.799999564, 8.049999716))
            ThreePointArc((-262.799999564, 8.049999716), (-262.741420837, 8.191421273), (-262.59999928, 8.25))
            Line((-262.59999928, 8.25), (-260.049999564, 8.25))
            Line((-260.049999564, 8.25), (-256.00446543, 4.204465866))
            Line((-256.00446543, 4.204465866), (-256.00446543, 0.899999619))
            Line((-256.00446543, 0.899999619), (-255.484852164, 0))
            Line((-255.484852164, 0), (-256.00446543, -0.899999619))
            Line((-256.00446543, -0.899999619), (-256.00446543, -4.204465866))
            Line((-256.00446543, -4.204465866), (-260.049999564, -8.25))
            Line((-260.049999564, -8.25), (-262.59999928, -8.25))
            ThreePointArc((-262.59999928, -8.25), (-262.741420837, -8.191421273), (-262.799999564, -8.049999716))
            Line((-262.799999564, -8.049999716), (-262.799999564, -4.649999613))
            ThreePointArc((-262.799999564, -4.649999613), (-262.975735606, -4.225735278), (-263.39999994, -4.049999237))
            Line((-263.39999994, -4.049999237), (-264.300000043, -4.049999237))
            ThreePointArc((-264.300000043, -4.049999237), (-264.4414216, -4.108577964), (-264.500000327, -4.249999521))
            Line((-264.500000327, -4.249999521), (-264.500000327, -4.349998953))
            ThreePointArc((-264.500000327, -4.349998953), (-264.558579054, -4.49142051), (-264.700000611, -4.549999237))
            Line((-264.700000611, -4.549999237), (-264.799999716, -4.549999237))
            ThreePointArc((-264.799999716, -4.549999237), (-264.941421273, -4.608577964), (-265, -4.749999521))
            Line((-265, -4.749999521), (-265, -13.000000346))
            ThreePointArc((-265, -13.000000346), (-264.414213664, -14.414213664), (-263.000000346, -15))
            Line((-263.000000346, -15), (-254.749999945, -15))
            ThreePointArc((-254.749999945, -15), (-254.60857832, -14.941421245), (-254.549999564, -14.799999619))
            Line((-254.549999564, -14.799999619), (-254.549999564, -14.69999942))
            ThreePointArc((-254.549999564, -14.69999942), (-254.49142109, -14.558578474), (-254.350000144, -14.5))
            Line((-254.350000144, -14.5), (-254.250000374, -14.5))
            ThreePointArc((-254.250000374, -14.5), (-254.108578753, -14.441421247), (-254.05, -14.299999626))
            Line((-254.05, -14.299999626), (-254.05, -13.399999434))
            ThreePointArc((-254.05, -13.399999434), (-254.225735989, -12.975735226), (-254.650000197, -12.799999237))
            Line((-254.650000197, -12.799999237), (-258.049999924, -12.799999237))
            ThreePointArc((-258.049999924, -12.799999237), (-258.191421565, -12.741420475), (-258.250000327, -12.599998834))
            Line((-258.250000327, -12.599998834), (-258.250000327, -10.049999237))
            Line((-258.250000327, -10.049999237), (-254.204466193, -6))
            Line((-254.204466193, -6), (-250.899999946, -6))
            Line((-250.899999946, -6), (-250, -5.484851837))
            Line((-250, -5.484851837), (-249.100000054, -6))
            Line((-249.100000054, -6), (-245.795533807, -6))
            Line((-245.795533807, -6), (-241.749999673, -10.049999237))
            Line((-241.749999673, -10.049999237), (-241.749999673, -12.599998834))
            ThreePointArc((-241.749999673, -12.599998834), (-241.808578435, -12.741420475), (-241.950000076, -12.799999237))
            Line((-241.950000076, -12.799999237), (-245.349999803, -12.799999237))
            ThreePointArc((-245.349999803, -12.799999237), (-245.774264011, -12.975735226), (-245.95, -13.399999434))
            Line((-245.95, -13.399999434), (-245.95, -14.299999626))
            ThreePointArc((-245.95, -14.299999626), (-245.891421247, -14.441421247), (-245.749999626, -14.5))
            Line((-245.749999626, -14.5), (-245.649999856, -14.5))
            ThreePointArc((-245.649999856, -14.5), (-245.50857891, -14.558578474), (-245.450000436, -14.69999942))
            Line((-245.450000436, -14.69999942), (-245.450000436, -14.799999619))
            ThreePointArc((-245.450000436, -14.799999619), (-245.39142168, -14.941421245), (-245.250000055, -15))
            Line((-245.250000055, -15), (-236.999999654, -15))
            ThreePointArc((-236.999999654, -15), (-235.585786336, -14.414213664), (-235, -13.000000346))
            Line((-235, -13.000000346), (-235, -4.749999521))
            ThreePointArc((-235, -4.749999521), (-235.058578727, -4.608577964), (-235.200000284, -4.549999237))
            Line((-235.200000284, -4.549999237), (-235.299999389, -4.549999237))
            ThreePointArc((-235.299999389, -4.549999237), (-235.441420946, -4.49142051), (-235.499999673, -4.349998953))
            Line((-235.499999673, -4.349998953), (-235.499999673, -4.249999521))
            ThreePointArc((-235.499999673, -4.249999521), (-235.5585784, -4.108577964), (-235.699999957, -4.049999237))
            Line((-235.699999957, -4.049999237), (-236.60000006, -4.049999237))
            ThreePointArc((-236.60000006, -4.049999237), (-237.024264394, -4.225735278), (-237.200000436, -4.649999613))
            Line((-237.200000436, -4.649999613), (-237.200000436, -8.049999716))
            ThreePointArc((-237.200000436, -8.049999716), (-237.258579163, -8.191421273), (-237.40000072, -8.25))
            Line((-237.40000072, -8.25), (-239.950000436, -8.25))
            Line((-239.950000436, -8.25), (-243.99553457, -4.204465866))
            Line((-243.99553457, -4.204465866), (-243.99553457, -0.899999619))
            Line((-243.99553457, -0.899999619), (-244.515147836, 0))
            Line((-244.515147836, 0), (-243.99553457, 0.899999619))
            Line((-243.99553457, 0.899999619), (-243.99553457, 4.204465866))
            Line((-243.99553457, 4.204465866), (-239.950000436, 8.25))
            Line((-239.950000436, 8.25), (-237.40000072, 8.25))
            ThreePointArc((-237.40000072, 8.25), (-237.258579163, 8.191421273), (-237.200000436, 8.049999716))
            Line((-237.200000436, 8.049999716), (-237.200000436, 4.649999613))
            ThreePointArc((-237.200000436, 4.649999613), (-237.024264394, 4.225735278), (-236.60000006, 4.049999237))
            Line((-236.60000006, 4.049999237), (-235.699999957, 4.049999237))
            ThreePointArc((-235.699999957, 4.049999237), (-235.5585784, 4.108577964), (-235.499999673, 4.249999521))
            Line((-235.499999673, 4.249999521), (-235.499999673, 4.349998953))
            ThreePointArc((-235.499999673, 4.349998953), (-235.441420946, 4.49142051), (-235.299999389, 4.549999237))
        make_face()
        with BuildLine():
            Line((-246.864070588, 4.518400903), (-248.399870476, 3.280561767))
            ThreePointArc((-248.399870476, 3.280561767), (-250, 3.65), (-251.600129524, 3.280561767))
            Line((-251.600129524, 3.280561767), (-253.135929412, 4.518400903))
            ThreePointArc((-253.135929412, 4.518400903), (-253.881002259, 3.897155561), (-254.505336892, 3.154669473))
            Line((-254.505336892, 3.154669473), (-253.280561732, 1.600129597))
            ThreePointArc((-253.280561732, 1.600129597), (-253.65, 0), (-253.280561732, -1.600129597))
            Line((-253.280561732, -1.600129597), (-254.505336892, -3.154669473))
            ThreePointArc((-254.505336892, -3.154669473), (-253.881002259, -3.897155561), (-253.135929412, -4.518400903))
            Line((-253.135929412, -4.518400903), (-251.600129524, -3.280561767))
            ThreePointArc((-251.600129524, -3.280561767), (-250, -3.65), (-248.399870476, -3.280561767))
            Line((-248.399870476, -3.280561767), (-246.864070588, -4.518400903))
            ThreePointArc((-246.864070588, -4.518400903), (-246.118997741, -3.897155561), (-245.494663108, -3.154669473))
            Line((-245.494663108, -3.154669473), (-246.719438268, -1.600129597))
            ThreePointArc((-246.719438268, -1.600129597), (-246.35, 0), (-246.719438268, 1.600129597))
            Line((-246.719438268, 1.600129597), (-245.494663108, 3.154669473))
            ThreePointArc((-245.494663108, 3.154669473), (-246.118997741, 3.897155561), (-246.864070588, 4.518400903))
        make_face(mode=Mode.SUBTRACT)
        with BuildLine():
            Line((-260.500000318, -9.499999635), (-262.7000011, -9.499999635))
            ThreePointArc((-262.7000011, -9.499999635), (-263.407107874, -9.792892851), (-263.70000109, -10.499999626))
            Line((-263.70000109, -10.499999626), (-263.70000109, -12.700000408))
            ThreePointArc((-263.70000109, -12.700000408), (-263.407107874, -13.407107182), (-262.7000011, -13.700000398))
            Line((-262.7000011, -13.700000398), (-260.500000318, -13.700000398))
            ThreePointArc((-260.500000318, -13.700000398), (-259.792893543, -13.407107182), (-259.500000327, -12.700000408))
            Line((-259.500000327, -12.700000408), (-259.500000327, -10.499999626))
            ThreePointArc((-259.500000327, -10.499999626), (-259.792893543, -9.792892851), (-260.500000318, -9.499999635))
        make_face(mode=Mode.SUBTRACT)
        with BuildLine():
            Line((-259.500000327, 12.700000408), (-259.500000327, 10.499999626))
            ThreePointArc((-259.500000327, 10.499999626), (-259.792893543, 9.792892851), (-260.500000318, 9.499999635))
            Line((-260.500000318, 9.499999635), (-262.7000011, 9.499999635))
            ThreePointArc((-262.7000011, 9.499999635), (-263.407107874, 9.792892851), (-263.70000109, 10.499999626))
            Line((-263.70000109, 10.499999626), (-263.70000109, 12.700000408))
            ThreePointArc((-263.70000109, 12.700000408), (-263.407107874, 13.407107182), (-262.7000011, 13.700000398))
            Line((-262.7000011, 13.700000398), (-260.500000318, 13.700000398))
            ThreePointArc((-260.500000318, 13.700000398), (-259.792893543, 13.407107182), (-259.500000327, 12.700000408))
        make_face(mode=Mode.SUBTRACT)
        with BuildLine():
            Line((-236.29999891, 12.700000408), (-236.29999891, 10.499999626))
            ThreePointArc((-236.29999891, 10.499999626), (-236.592892126, 9.792892851), (-237.2999989, 9.499999635))
            Line((-237.2999989, 9.499999635), (-239.499999682, 9.499999635))
            ThreePointArc((-239.499999682, 9.499999635), (-240.207106457, 9.792892851), (-240.499999673, 10.499999626))
            Line((-240.499999673, 10.499999626), (-240.499999673, 12.700000408))
            ThreePointArc((-240.499999673, 12.700000408), (-240.207106457, 13.407107182), (-239.499999682, 13.700000398))
            Line((-239.499999682, 13.700000398), (-237.2999989, 13.700000398))
            ThreePointArc((-237.2999989, 13.700000398), (-236.592892126, 13.407107182), (-236.29999891, 12.700000408))
        make_face(mode=Mode.SUBTRACT)
        with BuildLine():
            Line((-239.499999682, -9.499999635), (-237.2999989, -9.499999635))
            ThreePointArc((-237.2999989, -9.499999635), (-236.592892126, -9.792892851), (-236.29999891, -10.499999626))
            Line((-236.29999891, -10.499999626), (-236.29999891, -12.700000408))
            ThreePointArc((-236.29999891, -12.700000408), (-236.592892126, -13.407107182), (-237.2999989, -13.700000398))
            Line((-237.2999989, -13.700000398), (-239.499999682, -13.700000398))
            ThreePointArc((-239.499999682, -13.700000398), (-240.207106457, -13.407107182), (-240.499999673, -12.700000408))
            Line((-240.499999673, -12.700000408), (-240.499999673, -10.499999626))
            ThreePointArc((-240.499999673, -10.499999626), (-240.207106457, -9.792892851), (-239.499999682, -9.499999635))
        make_face(mode=Mode.SUBTRACT)
    # profile 2 of 2: a face of its own
    with BuildSketch(Plane(origin=(0, 0, 0), x_dir=(0, 0, -1), z_dir=(1, 0, 0))):
        with BuildLine():
            Line((264.700000611, 4.549999237), (264.799999716, 4.549999237))
            ThreePointArc((264.799999716, 4.549999237), (264.941421273, 4.608577964), (265, 4.749999521))
            Line((265, 4.749999521), (265, 13.000000346))
            ThreePointArc((265, 13.000000346), (264.414213664, 14.414213664), (263.000000346, 15))
            Line((263.000000346, 15), (254.749999945, 15))
            ThreePointArc((254.749999945, 15), (254.60857832, 14.941421245), (254.549999564, 14.799999619))
            Line((254.549999564, 14.799999619), (254.549999564, 14.69999942))
            ThreePointArc((254.549999564, 14.69999942), (254.49142109, 14.558578474), (254.350000144, 14.5))
            Line((254.350000144, 14.5), (254.250000374, 14.5))
            ThreePointArc((254.250000374, 14.5), (254.108578753, 14.441421247), (254.05, 14.299999626))
            Line((254.05, 14.299999626), (254.05, 13.399999434))
            ThreePointArc((254.05, 13.399999434), (254.225735989, 12.975735226), (254.650000197, 12.799999237))
            Line((254.650000197, 12.799999237), (258.049999924, 12.799999237))
            ThreePointArc((258.049999924, 12.799999237), (258.191421565, 12.741420475), (258.250000327, 12.599998834))
            Line((258.250000327, 12.599998834), (258.250000327, 10.049999237))
            Line((258.250000327, 10.049999237), (254.204466193, 6))
            Line((254.204466193, 6), (250.899999946, 6))
            Line((250.899999946, 6), (250, 5.484851837))
            Line((250, 5.484851837), (249.100000054, 6))
            Line((249.100000054, 6), (245.795533807, 6))
            Line((245.795533807, 6), (241.749999673, 10.049999237))
            Line((241.749999673, 10.049999237), (241.749999673, 12.599998834))
            ThreePointArc((241.749999673, 12.599998834), (241.808578435, 12.741420475), (241.950000076, 12.799999237))
            Line((241.950000076, 12.799999237), (245.349999803, 12.799999237))
            ThreePointArc((245.349999803, 12.799999237), (245.774264011, 12.975735226), (245.95, 13.399999434))
            Line((245.95, 13.399999434), (245.95, 14.299999626))
            ThreePointArc((245.95, 14.299999626), (245.891421247, 14.441421247), (245.749999626, 14.5))
            Line((245.749999626, 14.5), (245.649999856, 14.5))
            ThreePointArc((245.649999856, 14.5), (245.50857891, 14.558578474), (245.450000436, 14.69999942))
            Line((245.450000436, 14.69999942), (245.450000436, 14.799999619))
            ThreePointArc((245.450000436, 14.799999619), (245.39142168, 14.941421245), (245.250000055, 15))
            Line((245.250000055, 15), (236.999999654, 15))
            ThreePointArc((236.999999654, 15), (235.585786336, 14.414213664), (235, 13.000000346))
            Line((235, 13.000000346), (235, 4.749999521))
            ThreePointArc((235, 4.749999521), (235.058578727, 4.608577964), (235.200000284, 4.549999237))
            Line((235.200000284, 4.549999237), (235.299999389, 4.549999237))
            ThreePointArc((235.299999389, 4.549999237), (235.441420946, 4.49142051), (235.499999673, 4.349998953))
            Line((235.499999673, 4.349998953), (235.499999673, 4.249999521))
            ThreePointArc((235.499999673, 4.249999521), (235.5585784, 4.108577964), (235.699999957, 4.049999237))
            Line((235.699999957, 4.049999237), (236.60000006, 4.049999237))
            ThreePointArc((236.60000006, 4.049999237), (237.024264394, 4.225735278), (237.200000436, 4.649999613))
            Line((237.200000436, 4.649999613), (237.200000436, 8.049999716))
            ThreePointArc((237.200000436, 8.049999716), (237.258579163, 8.191421273), (237.40000072, 8.25))
            Line((237.40000072, 8.25), (239.950000436, 8.25))
            Line((239.950000436, 8.25), (243.99553457, 4.204465866))
            Line((243.99553457, 4.204465866), (243.99553457, 0.899999619))
            Line((243.99553457, 0.899999619), (244.515147836, 0))
            Line((244.515147836, 0), (243.99553457, -0.899999619))
            Line((243.99553457, -0.899999619), (243.99553457, -4.204465866))
            Line((243.99553457, -4.204465866), (239.950000436, -8.25))
            Line((239.950000436, -8.25), (237.40000072, -8.25))
            ThreePointArc((237.40000072, -8.25), (237.258579163, -8.191421273), (237.200000436, -8.049999716))
            Line((237.200000436, -8.049999716), (237.200000436, -4.649999613))
            ThreePointArc((237.200000436, -4.649999613), (237.024264394, -4.225735278), (236.60000006, -4.049999237))
            Line((236.60000006, -4.049999237), (235.699999957, -4.049999237))
            ThreePointArc((235.699999957, -4.049999237), (235.5585784, -4.108577964), (235.499999673, -4.249999521))
            Line((235.499999673, -4.249999521), (235.499999673, -4.349998953))
            ThreePointArc((235.499999673, -4.349998953), (235.441420946, -4.49142051), (235.299999389, -4.549999237))
            Line((235.299999389, -4.549999237), (235.200000284, -4.549999237))
            ThreePointArc((235.200000284, -4.549999237), (235.058578727, -4.608577964), (235, -4.749999521))
            Line((235, -4.749999521), (235, -13.000000346))
            ThreePointArc((235, -13.000000346), (235.585786336, -14.414213664), (236.999999654, -15))
            Line((236.999999654, -15), (245.250000055, -15))
            ThreePointArc((245.250000055, -15), (245.39142168, -14.941421245), (245.450000436, -14.799999619))
            Line((245.450000436, -14.799999619), (245.450000436, -14.69999942))
            ThreePointArc((245.450000436, -14.69999942), (245.50857891, -14.558578474), (245.649999856, -14.5))
            Line((245.649999856, -14.5), (245.749999626, -14.5))
            ThreePointArc((245.749999626, -14.5), (245.891421247, -14.441421247), (245.95, -14.299999626))
            Line((245.95, -14.299999626), (245.95, -13.399999434))
            ThreePointArc((245.95, -13.399999434), (245.774264011, -12.975735226), (245.349999803, -12.799999237))
            Line((245.349999803, -12.799999237), (241.950000076, -12.799999237))
            ThreePointArc((241.950000076, -12.799999237), (241.808578435, -12.741420475), (241.749999673, -12.599998834))
            Line((241.749999673, -12.599998834), (241.749999673, -10.049999237))
            Line((241.749999673, -10.049999237), (245.795533807, -6))
            Line((245.795533807, -6), (249.100000054, -6))
            Line((249.100000054, -6), (250, -5.484851837))
            Line((250, -5.484851837), (250.899999946, -6))
            Line((250.899999946, -6), (254.204466193, -6))
            Line((254.204466193, -6), (258.250000327, -10.049999237))
            Line((258.250000327, -10.049999237), (258.250000327, -12.599998834))
            ThreePointArc((258.250000327, -12.599998834), (258.191421565, -12.741420475), (258.049999924, -12.799999237))
            Line((258.049999924, -12.799999237), (254.650000197, -12.799999237))
            ThreePointArc((254.650000197, -12.799999237), (254.225735989, -12.975735226), (254.05, -13.399999434))
            Line((254.05, -13.399999434), (254.05, -14.299999626))
            ThreePointArc((254.05, -14.299999626), (254.108578753, -14.441421247), (254.250000374, -14.5))
            Line((254.250000374, -14.5), (254.350000144, -14.5))
            ThreePointArc((254.350000144, -14.5), (254.49142109, -14.558578474), (254.549999564, -14.69999942))
            Line((254.549999564, -14.69999942), (254.549999564, -14.799999619))
            ThreePointArc((254.549999564, -14.799999619), (254.60857832, -14.941421245), (254.749999945, -15))
            Line((254.749999945, -15), (263.000000346, -15))
            ThreePointArc((263.000000346, -15), (264.414213664, -14.414213664), (265, -13.000000346))
            Line((265, -13.000000346), (265, -4.749999521))
            ThreePointArc((265, -4.749999521), (264.941421273, -4.608577964), (264.799999716, -4.549999237))
            Line((264.799999716, -4.549999237), (264.700000611, -4.549999237))
            ThreePointArc((264.700000611, -4.549999237), (264.558579054, -4.49142051), (264.500000327, -4.349998953))
            Line((264.500000327, -4.349998953), (264.500000327, -4.249999521))
            ThreePointArc((264.500000327, -4.249999521), (264.4414216, -4.108577964), (264.300000043, -4.049999237))
            Line((264.300000043, -4.049999237), (263.39999994, -4.049999237))
            ThreePointArc((263.39999994, -4.049999237), (262.975735606, -4.225735278), (262.799999564, -4.649999613))
            Line((262.799999564, -4.649999613), (262.799999564, -8.049999716))
            ThreePointArc((262.799999564, -8.049999716), (262.741420837, -8.191421273), (262.59999928, -8.25))
            Line((262.59999928, -8.25), (260.049999564, -8.25))
            Line((260.049999564, -8.25), (256.00446543, -4.204465866))
            Line((256.00446543, -4.204465866), (256.00446543, -0.899999619))
            Line((256.00446543, -0.899999619), (255.484852164, 0))
            Line((255.484852164, 0), (256.00446543, 0.899999619))
            Line((256.00446543, 0.899999619), (256.00446543, 4.204465866))
            Line((256.00446543, 4.204465866), (260.049999564, 8.25))
            Line((260.049999564, 8.25), (262.59999928, 8.25))
            ThreePointArc((262.59999928, 8.25), (262.741420837, 8.191421273), (262.799999564, 8.049999716))
            Line((262.799999564, 8.049999716), (262.799999564, 4.649999613))
            ThreePointArc((262.799999564, 4.649999613), (262.975735606, 4.225735278), (263.39999994, 4.049999237))
            Line((263.39999994, 4.049999237), (264.300000043, 4.049999237))
            ThreePointArc((264.300000043, 4.049999237), (264.4414216, 4.108577964), (264.500000327, 4.249999521))
            Line((264.500000327, 4.249999521), (264.500000327, 4.349998953))
            ThreePointArc((264.500000327, 4.349998953), (264.558579054, 4.49142051), (264.700000611, 4.549999237))
        make_face()
        with BuildLine():
            Line((253.135929412, 4.518400903), (251.600129524, 3.280561767))
            ThreePointArc((251.600129524, 3.280561767), (250, 3.65), (248.399870476, 3.280561767))
            Line((248.399870476, 3.280561767), (246.864070588, 4.518400903))
            ThreePointArc((246.864070588, 4.518400903), (246.118997741, 3.897155561), (245.494663108, 3.154669473))
            Line((245.494663108, 3.154669473), (246.719438268, 1.600129597))
            ThreePointArc((246.719438268, 1.600129597), (246.35, 0), (246.719438268, -1.600129597))
            Line((246.719438268, -1.600129597), (245.494663108, -3.154669473))
            ThreePointArc((245.494663108, -3.154669473), (246.118997741, -3.897155561), (246.864070588, -4.518400903))
            Line((246.864070588, -4.518400903), (248.399870476, -3.280561767))
            ThreePointArc((248.399870476, -3.280561767), (250, -3.65), (251.600129524, -3.280561767))
            Line((251.600129524, -3.280561767), (253.135929412, -4.518400903))
            ThreePointArc((253.135929412, -4.518400903), (253.881002259, -3.897155561), (254.505336892, -3.154669473))
            Line((254.505336892, -3.154669473), (253.280561732, -1.600129597))
            ThreePointArc((253.280561732, -1.600129597), (253.65, 0), (253.280561732, 1.600129597))
            Line((253.280561732, 1.600129597), (254.505336892, 3.154669473))
            ThreePointArc((254.505336892, 3.154669473), (253.881002259, 3.897155561), (253.135929412, 4.518400903))
        make_face(mode=Mode.SUBTRACT)
        with BuildLine():
            Line((239.499999682, -9.499999635), (237.2999989, -9.499999635))
            ThreePointArc((237.2999989, -9.499999635), (236.592892126, -9.792892851), (236.29999891, -10.499999626))
            Line((236.29999891, -10.499999626), (236.29999891, -12.700000408))
            ThreePointArc((236.29999891, -12.700000408), (236.592892126, -13.407107182), (237.2999989, -13.700000398))
            Line((237.2999989, -13.700000398), (239.499999682, -13.700000398))
            ThreePointArc((239.499999682, -13.700000398), (240.207106457, -13.407107182), (240.499999673, -12.700000408))
            Line((240.499999673, -12.700000408), (240.499999673, -10.499999626))
            ThreePointArc((240.499999673, -10.499999626), (240.207106457, -9.792892851), (239.499999682, -9.499999635))
        make_face(mode=Mode.SUBTRACT)
        with BuildLine():
            Line((240.499999673, 12.700000408), (240.499999673, 10.499999626))
            ThreePointArc((240.499999673, 10.499999626), (240.207106457, 9.792892851), (239.499999682, 9.499999635))
            Line((239.499999682, 9.499999635), (237.2999989, 9.499999635))
            ThreePointArc((237.2999989, 9.499999635), (236.592892126, 9.792892851), (236.29999891, 10.499999626))
            Line((236.29999891, 10.499999626), (236.29999891, 12.700000408))
            ThreePointArc((236.29999891, 12.700000408), (236.592892126, 13.407107182), (237.2999989, 13.700000398))
            Line((237.2999989, 13.700000398), (239.499999682, 13.700000398))
            ThreePointArc((239.499999682, 13.700000398), (240.207106457, 13.407107182), (240.499999673, 12.700000408))
        make_face(mode=Mode.SUBTRACT)
        with BuildLine():
            Line((263.70000109, 12.700000408), (263.70000109, 10.499999626))
            ThreePointArc((263.70000109, 10.499999626), (263.407107874, 9.792892851), (262.7000011, 9.499999635))
            Line((262.7000011, 9.499999635), (260.500000318, 9.499999635))
            ThreePointArc((260.500000318, 9.499999635), (259.792893543, 9.792892851), (259.500000327, 10.499999626))
            Line((259.500000327, 10.499999626), (259.500000327, 12.700000408))
            ThreePointArc((259.500000327, 12.700000408), (259.792893543, 13.407107182), (260.500000318, 13.700000398))
            Line((260.500000318, 13.700000398), (262.7000011, 13.700000398))
            ThreePointArc((262.7000011, 13.700000398), (263.407107874, 13.407107182), (263.70000109, 12.700000408))
        make_face(mode=Mode.SUBTRACT)
        with BuildLine():
            Line((260.500000318, -9.499999635), (262.7000011, -9.499999635))
            ThreePointArc((262.7000011, -9.499999635), (263.407107874, -9.792892851), (263.70000109, -10.499999626))
            Line((263.70000109, -10.499999626), (263.70000109, -12.700000408))
            ThreePointArc((263.70000109, -12.700000408), (263.407107874, -13.407107182), (262.7000011, -13.700000398))
            Line((262.7000011, -13.700000398), (260.500000318, -13.700000398))
            ThreePointArc((260.500000318, -13.700000398), (259.792893543, -13.407107182), (259.500000327, -12.700000408))
            Line((259.500000327, -12.700000408), (259.500000327, -10.499999626))
            ThreePointArc((259.500000327, -10.499999626), (259.792893543, -9.792892851), (260.500000318, -9.499999635))
        make_face(mode=Mode.SUBTRACT)
    extrude(amount=BOSS_EXTRUDE2_DEPTH, both=True)


with BuildPart() as body_2_2:
    # Sketch16 → Boss-Extrude3 (new body)
    with BuildSketch(Plane.ZY.offset(365)):
        with Locations((250, 30.384042372)):
            Circle(SKETCH16_R)
    extrude(amount=-BOSS_EXTRUDE3_DEPTH)


with BuildPart() as body_3:
    # Sketch16 → Boss-Extrude3 2 (new body)
    with BuildSketch(Plane.ZY.offset(365)):
        with Locations((-250, 30.384042372)):
            Circle(SKETCH16_R)
    extrude(amount=-BOSS_EXTRUDE3_2_DEPTH)


solid = Compound([body_2_2.part, body_3.part])
